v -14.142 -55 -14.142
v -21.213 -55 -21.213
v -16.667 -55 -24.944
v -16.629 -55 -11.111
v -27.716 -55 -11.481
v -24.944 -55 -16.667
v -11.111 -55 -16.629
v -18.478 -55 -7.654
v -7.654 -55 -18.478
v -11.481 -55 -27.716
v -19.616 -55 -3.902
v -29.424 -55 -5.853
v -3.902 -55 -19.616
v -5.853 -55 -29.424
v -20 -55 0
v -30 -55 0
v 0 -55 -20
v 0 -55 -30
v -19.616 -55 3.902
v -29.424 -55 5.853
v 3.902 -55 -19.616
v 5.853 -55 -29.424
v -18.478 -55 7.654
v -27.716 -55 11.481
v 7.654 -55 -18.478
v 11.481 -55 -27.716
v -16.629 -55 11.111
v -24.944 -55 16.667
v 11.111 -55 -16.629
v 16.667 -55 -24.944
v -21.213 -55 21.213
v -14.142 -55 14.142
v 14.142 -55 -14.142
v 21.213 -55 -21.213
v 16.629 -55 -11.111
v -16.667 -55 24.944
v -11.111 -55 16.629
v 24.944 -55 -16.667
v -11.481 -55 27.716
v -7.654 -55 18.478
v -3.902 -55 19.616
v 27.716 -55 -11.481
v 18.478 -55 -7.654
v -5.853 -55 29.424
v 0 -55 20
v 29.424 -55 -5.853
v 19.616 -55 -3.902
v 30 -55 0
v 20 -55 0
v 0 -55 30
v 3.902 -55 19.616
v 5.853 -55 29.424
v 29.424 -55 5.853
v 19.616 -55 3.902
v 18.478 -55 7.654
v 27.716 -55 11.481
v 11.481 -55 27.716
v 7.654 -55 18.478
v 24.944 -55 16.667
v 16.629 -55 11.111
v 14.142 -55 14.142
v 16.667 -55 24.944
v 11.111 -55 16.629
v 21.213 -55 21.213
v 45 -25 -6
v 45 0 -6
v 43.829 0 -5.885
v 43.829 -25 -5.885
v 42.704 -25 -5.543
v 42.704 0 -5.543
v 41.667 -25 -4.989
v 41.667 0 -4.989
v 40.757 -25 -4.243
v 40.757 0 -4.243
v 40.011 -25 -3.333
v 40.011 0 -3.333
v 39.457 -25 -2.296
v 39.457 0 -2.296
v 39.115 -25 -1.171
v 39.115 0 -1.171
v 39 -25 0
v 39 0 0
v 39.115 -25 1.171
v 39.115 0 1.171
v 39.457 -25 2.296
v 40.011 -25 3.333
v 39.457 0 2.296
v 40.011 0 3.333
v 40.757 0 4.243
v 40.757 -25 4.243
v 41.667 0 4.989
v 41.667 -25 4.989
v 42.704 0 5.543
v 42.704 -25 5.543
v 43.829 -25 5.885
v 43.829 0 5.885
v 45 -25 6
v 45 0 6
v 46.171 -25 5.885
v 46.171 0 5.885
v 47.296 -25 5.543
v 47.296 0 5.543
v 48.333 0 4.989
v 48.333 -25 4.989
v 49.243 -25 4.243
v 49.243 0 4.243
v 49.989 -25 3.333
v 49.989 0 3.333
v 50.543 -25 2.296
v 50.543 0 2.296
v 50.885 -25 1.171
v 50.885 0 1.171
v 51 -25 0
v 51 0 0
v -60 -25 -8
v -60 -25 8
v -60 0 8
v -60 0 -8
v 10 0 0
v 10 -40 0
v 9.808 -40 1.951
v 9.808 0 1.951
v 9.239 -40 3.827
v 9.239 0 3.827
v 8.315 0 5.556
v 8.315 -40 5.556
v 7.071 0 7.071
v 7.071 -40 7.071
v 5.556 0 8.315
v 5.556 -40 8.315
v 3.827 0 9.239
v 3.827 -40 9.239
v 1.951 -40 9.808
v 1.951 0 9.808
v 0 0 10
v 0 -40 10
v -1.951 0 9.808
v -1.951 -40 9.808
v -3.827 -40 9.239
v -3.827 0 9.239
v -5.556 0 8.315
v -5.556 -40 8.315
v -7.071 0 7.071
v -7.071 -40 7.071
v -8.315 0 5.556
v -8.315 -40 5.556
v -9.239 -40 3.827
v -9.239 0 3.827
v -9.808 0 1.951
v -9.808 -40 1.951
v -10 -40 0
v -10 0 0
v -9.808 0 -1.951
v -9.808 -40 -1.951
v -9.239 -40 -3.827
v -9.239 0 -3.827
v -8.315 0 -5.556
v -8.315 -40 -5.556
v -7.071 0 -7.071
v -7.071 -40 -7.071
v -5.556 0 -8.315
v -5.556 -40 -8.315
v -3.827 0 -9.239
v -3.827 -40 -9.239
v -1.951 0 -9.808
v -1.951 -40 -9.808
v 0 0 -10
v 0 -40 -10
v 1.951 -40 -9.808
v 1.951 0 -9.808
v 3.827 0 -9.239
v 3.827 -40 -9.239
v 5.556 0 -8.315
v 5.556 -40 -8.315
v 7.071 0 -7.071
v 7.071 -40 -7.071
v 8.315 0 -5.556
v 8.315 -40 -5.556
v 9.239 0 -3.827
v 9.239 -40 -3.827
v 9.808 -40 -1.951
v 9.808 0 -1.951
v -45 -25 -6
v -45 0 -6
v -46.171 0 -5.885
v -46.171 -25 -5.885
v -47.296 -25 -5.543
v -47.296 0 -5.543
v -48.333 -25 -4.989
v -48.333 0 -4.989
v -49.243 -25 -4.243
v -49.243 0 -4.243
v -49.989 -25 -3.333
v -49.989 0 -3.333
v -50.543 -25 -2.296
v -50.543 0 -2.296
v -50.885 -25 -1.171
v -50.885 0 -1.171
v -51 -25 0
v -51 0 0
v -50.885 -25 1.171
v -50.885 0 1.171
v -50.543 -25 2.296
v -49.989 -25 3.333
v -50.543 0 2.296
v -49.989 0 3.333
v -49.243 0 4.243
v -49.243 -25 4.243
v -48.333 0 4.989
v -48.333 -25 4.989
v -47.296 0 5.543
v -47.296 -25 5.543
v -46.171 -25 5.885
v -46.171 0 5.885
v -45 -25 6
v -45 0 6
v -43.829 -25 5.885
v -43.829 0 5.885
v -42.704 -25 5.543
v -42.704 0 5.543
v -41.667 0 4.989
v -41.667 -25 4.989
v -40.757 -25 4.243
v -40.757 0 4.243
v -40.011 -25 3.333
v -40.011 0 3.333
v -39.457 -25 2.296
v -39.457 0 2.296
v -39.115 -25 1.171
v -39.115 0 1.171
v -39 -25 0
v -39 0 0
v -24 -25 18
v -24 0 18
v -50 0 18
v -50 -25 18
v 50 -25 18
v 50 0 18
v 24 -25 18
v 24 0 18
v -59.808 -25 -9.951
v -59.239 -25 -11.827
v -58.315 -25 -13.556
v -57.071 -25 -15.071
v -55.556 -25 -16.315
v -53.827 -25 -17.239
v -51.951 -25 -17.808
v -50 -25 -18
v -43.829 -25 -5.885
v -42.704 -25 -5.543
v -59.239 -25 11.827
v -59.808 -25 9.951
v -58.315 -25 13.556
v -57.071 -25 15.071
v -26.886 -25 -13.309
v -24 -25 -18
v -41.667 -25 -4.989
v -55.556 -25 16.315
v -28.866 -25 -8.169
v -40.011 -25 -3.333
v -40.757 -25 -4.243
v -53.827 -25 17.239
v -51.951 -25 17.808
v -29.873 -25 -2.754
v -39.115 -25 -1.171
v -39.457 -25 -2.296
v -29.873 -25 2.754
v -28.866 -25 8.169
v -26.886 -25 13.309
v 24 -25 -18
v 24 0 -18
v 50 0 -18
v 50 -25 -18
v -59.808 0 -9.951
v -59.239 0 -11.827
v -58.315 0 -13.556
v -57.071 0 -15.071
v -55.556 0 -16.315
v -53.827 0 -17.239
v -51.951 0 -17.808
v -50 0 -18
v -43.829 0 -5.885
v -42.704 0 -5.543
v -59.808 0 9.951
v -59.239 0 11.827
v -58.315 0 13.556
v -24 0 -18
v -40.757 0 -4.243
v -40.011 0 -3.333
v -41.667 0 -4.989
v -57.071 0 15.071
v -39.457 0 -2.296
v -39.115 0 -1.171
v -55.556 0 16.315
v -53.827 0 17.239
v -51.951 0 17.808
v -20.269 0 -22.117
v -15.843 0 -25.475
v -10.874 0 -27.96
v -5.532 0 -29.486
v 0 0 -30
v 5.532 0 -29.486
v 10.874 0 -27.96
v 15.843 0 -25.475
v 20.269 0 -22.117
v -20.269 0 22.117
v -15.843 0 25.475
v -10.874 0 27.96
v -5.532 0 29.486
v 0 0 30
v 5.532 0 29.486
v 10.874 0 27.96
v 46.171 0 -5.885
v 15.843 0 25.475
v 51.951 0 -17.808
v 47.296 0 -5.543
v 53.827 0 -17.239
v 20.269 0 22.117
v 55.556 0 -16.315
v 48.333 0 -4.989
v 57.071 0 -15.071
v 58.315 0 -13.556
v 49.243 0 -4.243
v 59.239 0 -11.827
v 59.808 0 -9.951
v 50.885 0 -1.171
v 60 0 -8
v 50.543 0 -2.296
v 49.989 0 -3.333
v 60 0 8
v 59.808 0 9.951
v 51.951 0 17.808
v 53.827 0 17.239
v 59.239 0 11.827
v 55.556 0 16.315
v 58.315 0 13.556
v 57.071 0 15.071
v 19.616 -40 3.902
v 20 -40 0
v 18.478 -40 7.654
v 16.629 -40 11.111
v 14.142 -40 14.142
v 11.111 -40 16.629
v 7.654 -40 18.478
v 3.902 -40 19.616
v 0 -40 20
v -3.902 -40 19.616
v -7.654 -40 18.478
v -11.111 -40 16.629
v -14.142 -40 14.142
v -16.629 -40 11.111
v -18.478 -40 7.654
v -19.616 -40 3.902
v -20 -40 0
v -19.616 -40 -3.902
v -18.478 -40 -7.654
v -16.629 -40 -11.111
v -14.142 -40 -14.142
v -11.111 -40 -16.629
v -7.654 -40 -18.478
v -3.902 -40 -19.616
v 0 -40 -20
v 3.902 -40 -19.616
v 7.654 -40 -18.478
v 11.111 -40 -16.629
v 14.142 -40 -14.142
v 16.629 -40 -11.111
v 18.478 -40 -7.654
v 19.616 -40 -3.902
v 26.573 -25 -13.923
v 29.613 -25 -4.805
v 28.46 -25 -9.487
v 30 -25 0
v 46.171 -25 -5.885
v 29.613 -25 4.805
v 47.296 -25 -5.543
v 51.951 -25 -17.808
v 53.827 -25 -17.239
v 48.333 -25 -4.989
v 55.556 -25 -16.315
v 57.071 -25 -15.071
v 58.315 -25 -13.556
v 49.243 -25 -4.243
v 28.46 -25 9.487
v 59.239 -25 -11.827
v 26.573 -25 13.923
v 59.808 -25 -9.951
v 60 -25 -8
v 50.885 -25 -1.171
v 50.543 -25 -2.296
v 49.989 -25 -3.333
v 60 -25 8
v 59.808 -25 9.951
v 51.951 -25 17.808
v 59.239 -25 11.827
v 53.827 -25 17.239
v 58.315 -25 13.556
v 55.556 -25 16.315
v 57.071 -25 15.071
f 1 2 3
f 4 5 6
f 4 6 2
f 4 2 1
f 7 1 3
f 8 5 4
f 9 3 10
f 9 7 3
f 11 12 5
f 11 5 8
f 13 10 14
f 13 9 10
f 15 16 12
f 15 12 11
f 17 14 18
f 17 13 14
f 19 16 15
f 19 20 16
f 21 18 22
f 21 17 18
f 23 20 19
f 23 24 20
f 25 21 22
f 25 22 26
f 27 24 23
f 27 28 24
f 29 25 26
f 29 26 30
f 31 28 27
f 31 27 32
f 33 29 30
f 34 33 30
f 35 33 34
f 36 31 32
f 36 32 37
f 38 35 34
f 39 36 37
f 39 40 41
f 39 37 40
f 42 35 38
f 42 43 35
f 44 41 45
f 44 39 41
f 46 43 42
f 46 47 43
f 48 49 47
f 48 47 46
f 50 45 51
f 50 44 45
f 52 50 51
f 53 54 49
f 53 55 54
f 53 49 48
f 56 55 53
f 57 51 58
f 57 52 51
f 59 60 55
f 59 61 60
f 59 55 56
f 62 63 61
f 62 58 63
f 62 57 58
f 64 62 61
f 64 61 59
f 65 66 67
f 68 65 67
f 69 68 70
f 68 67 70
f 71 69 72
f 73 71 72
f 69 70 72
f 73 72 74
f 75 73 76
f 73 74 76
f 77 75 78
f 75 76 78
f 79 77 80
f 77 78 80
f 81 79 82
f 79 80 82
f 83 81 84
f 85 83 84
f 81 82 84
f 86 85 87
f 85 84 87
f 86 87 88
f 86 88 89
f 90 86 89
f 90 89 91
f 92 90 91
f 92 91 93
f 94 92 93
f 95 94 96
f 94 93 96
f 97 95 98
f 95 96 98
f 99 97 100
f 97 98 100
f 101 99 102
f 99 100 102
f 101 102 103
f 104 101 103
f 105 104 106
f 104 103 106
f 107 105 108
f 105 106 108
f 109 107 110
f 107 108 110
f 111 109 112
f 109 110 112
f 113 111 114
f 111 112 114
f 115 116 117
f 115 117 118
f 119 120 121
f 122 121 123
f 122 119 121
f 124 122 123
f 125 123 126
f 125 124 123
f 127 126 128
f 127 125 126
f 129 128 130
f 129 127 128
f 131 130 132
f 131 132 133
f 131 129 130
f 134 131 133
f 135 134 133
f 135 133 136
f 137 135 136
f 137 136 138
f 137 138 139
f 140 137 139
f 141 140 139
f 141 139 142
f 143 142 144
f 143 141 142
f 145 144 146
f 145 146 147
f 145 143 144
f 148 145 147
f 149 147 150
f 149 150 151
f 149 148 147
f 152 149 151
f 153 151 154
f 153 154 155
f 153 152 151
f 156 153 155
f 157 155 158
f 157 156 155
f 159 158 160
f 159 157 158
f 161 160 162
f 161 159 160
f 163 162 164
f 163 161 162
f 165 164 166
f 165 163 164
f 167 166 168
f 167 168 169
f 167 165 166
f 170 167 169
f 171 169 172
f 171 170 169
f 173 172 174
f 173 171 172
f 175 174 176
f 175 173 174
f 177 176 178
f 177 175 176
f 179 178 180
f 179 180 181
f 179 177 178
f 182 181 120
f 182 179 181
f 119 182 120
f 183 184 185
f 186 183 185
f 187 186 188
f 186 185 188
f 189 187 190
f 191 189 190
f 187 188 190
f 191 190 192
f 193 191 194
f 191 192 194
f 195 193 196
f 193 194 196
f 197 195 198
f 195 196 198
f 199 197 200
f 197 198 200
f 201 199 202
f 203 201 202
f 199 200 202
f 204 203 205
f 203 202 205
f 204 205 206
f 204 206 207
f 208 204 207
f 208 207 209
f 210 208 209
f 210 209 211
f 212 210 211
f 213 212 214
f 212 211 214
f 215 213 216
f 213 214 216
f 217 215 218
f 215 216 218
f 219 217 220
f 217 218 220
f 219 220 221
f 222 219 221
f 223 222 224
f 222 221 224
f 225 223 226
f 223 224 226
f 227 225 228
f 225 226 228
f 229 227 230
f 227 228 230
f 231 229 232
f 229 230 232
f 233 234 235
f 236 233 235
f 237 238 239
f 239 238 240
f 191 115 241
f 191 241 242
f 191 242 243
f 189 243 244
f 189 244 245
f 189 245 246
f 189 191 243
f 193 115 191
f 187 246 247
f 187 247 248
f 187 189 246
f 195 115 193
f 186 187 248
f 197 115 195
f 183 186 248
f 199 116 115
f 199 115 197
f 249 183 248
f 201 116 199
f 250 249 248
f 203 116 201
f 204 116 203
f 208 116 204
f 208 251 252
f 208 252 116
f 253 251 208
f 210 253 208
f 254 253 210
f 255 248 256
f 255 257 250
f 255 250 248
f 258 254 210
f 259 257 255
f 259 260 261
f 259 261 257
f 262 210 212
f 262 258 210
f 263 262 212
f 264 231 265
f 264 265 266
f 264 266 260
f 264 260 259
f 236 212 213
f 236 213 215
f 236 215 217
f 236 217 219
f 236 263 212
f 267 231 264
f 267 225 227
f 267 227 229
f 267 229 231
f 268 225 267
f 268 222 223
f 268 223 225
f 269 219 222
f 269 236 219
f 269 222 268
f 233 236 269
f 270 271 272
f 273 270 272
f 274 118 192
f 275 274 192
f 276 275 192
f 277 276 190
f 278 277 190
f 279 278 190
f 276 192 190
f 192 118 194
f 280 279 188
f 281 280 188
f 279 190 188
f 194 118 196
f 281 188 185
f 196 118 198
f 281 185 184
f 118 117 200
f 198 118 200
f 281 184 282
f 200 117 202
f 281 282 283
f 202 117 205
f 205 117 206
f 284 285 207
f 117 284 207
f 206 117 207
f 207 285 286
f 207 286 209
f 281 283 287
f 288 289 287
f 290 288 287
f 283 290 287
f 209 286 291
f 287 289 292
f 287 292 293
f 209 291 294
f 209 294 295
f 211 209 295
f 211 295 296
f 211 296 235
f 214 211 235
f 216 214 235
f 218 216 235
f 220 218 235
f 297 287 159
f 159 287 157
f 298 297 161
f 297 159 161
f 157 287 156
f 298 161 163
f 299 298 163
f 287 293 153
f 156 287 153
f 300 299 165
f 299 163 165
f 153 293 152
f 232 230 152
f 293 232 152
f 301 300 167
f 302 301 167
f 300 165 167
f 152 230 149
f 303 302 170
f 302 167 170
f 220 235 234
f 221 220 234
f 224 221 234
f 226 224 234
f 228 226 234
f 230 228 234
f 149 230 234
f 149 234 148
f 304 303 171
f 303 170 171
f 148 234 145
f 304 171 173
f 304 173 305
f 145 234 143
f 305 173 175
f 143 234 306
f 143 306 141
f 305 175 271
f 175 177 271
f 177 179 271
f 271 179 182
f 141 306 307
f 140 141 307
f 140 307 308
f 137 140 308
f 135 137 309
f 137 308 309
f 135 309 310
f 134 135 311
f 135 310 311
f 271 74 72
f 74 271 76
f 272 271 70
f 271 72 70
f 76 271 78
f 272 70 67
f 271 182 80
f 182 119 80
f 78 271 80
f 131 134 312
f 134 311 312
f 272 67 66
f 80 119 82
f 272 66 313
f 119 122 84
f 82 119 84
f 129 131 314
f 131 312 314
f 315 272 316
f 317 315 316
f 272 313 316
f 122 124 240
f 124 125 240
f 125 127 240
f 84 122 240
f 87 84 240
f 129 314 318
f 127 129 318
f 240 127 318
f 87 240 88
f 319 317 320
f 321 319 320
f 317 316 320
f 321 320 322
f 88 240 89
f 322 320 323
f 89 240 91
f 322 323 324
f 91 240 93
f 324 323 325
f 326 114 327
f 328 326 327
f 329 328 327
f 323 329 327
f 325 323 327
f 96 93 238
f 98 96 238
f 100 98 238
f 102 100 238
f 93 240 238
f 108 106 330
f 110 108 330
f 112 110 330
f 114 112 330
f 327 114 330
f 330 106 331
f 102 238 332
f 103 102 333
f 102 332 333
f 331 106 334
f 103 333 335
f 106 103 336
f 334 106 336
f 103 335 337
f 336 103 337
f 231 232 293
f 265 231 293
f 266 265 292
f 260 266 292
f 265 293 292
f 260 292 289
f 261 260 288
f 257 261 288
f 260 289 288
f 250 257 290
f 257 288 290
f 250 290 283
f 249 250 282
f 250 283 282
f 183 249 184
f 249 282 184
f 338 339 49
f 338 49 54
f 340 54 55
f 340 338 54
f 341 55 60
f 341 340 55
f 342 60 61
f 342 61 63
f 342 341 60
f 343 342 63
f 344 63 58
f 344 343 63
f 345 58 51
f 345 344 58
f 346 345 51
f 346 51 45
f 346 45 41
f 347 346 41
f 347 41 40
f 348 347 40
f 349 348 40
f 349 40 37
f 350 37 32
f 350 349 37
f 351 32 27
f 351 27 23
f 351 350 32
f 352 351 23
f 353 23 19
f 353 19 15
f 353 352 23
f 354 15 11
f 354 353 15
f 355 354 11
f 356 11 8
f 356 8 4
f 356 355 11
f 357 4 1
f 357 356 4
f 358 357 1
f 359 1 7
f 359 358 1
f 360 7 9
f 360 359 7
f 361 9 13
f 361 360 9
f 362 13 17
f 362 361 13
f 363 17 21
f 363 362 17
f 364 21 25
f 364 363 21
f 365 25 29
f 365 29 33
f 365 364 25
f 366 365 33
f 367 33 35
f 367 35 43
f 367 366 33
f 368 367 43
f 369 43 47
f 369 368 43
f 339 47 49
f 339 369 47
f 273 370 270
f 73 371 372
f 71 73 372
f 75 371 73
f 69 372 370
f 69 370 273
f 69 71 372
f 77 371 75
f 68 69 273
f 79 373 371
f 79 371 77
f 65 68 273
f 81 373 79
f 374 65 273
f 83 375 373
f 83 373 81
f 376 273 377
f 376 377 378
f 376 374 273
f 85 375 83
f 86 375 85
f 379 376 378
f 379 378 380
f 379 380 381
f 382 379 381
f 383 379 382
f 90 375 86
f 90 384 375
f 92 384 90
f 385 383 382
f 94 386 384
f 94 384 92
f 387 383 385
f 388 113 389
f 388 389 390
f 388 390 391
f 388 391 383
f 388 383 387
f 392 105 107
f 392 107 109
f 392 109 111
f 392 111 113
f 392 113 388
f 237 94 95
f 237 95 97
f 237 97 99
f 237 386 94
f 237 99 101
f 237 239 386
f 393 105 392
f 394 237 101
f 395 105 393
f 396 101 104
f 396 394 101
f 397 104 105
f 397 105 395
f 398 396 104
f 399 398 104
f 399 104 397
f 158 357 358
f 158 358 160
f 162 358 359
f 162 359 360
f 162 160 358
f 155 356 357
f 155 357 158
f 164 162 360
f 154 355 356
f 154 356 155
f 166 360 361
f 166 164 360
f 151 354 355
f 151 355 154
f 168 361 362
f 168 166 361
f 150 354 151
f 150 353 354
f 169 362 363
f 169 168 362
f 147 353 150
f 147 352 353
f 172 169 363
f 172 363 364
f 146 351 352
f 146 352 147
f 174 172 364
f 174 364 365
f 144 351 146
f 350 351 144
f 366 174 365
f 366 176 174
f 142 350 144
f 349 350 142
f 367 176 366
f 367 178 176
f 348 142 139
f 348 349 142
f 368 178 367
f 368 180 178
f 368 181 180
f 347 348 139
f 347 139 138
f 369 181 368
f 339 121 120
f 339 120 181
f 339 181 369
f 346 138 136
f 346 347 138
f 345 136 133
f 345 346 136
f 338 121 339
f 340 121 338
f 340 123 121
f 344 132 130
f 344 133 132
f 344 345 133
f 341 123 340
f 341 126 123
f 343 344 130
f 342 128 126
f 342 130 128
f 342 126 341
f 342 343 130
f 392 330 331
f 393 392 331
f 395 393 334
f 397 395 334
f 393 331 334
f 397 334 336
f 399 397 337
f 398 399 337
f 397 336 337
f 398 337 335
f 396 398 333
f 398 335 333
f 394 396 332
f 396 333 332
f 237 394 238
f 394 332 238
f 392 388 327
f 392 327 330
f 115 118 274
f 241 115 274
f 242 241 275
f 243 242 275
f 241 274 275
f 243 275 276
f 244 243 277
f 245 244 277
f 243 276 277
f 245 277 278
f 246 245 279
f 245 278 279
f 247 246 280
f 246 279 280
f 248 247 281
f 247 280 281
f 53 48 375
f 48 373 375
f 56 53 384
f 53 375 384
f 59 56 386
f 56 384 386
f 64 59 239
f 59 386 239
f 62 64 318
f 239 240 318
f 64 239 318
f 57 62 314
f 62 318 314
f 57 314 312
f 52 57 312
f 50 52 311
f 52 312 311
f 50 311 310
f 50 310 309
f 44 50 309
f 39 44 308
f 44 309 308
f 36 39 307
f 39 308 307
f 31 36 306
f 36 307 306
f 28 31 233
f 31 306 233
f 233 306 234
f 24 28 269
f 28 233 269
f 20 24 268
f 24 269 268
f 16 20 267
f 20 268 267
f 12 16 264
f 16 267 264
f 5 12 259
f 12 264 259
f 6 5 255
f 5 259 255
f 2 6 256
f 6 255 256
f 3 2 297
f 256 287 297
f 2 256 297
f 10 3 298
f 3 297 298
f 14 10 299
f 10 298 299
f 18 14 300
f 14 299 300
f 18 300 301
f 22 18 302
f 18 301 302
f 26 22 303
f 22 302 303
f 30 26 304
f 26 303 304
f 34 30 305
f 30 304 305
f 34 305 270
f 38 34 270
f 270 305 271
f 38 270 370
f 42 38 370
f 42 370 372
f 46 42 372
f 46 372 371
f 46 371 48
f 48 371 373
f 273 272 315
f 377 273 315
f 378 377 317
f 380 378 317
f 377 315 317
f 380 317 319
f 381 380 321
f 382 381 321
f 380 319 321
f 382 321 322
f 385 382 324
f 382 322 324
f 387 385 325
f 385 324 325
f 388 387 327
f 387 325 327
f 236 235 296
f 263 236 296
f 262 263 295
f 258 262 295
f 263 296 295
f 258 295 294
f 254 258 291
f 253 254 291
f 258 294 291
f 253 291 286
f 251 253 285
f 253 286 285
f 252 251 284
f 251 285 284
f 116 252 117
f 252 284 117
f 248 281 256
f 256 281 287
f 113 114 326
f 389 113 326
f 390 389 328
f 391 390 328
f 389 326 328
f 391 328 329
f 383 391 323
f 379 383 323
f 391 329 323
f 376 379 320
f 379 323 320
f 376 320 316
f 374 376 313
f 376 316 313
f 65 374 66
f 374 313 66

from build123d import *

# Parameters (mm, degrees)
F0_R     = 10
F1_DEPTH = 25
F2_R     = 30
F2_R_2   = 10
F3_DEPTH = 15
F4_R     = 30
F4_R_2   = 20
F5_DEPTH = 15


with BuildPart() as f1:
    # F0 (on Front) → F1 (new body)
    with BuildSketch(Plane.XZ):
        with BuildLine():
            ThreePointArc((24, -18), (28.4604989415, -9.4868329805), (30, 0))
            ThreePointArc((30, 0), (28.4604989415, 9.4868329805), (24, 18))
            Line((24, 18), (-24, 18))
            ThreePointArc((-24, 18), (-30, 0), (-24, -18))
            Line((-24, -18), (24, -18))
        make_face()
        Circle(F0_R, mode=Mode.SUBTRACT)
        with BuildLine():
            ThreePointArc((24, 18), (28.4604989415, 9.4868329805), (30, 0))
            ThreePointArc((30, 0), (28.4604989415, -9.4868329805), (24, -18))
            Line((24, -18), (45, -18))
            Line((45, -18), (50, -18))
            ThreePointArc((50, -18), (57.0710678119, -15.0710678119), (60, -8))
            Line((60, -8), (60, 8))
            ThreePointArc((60, 8), (57.0710678119, 15.0710678119), (50, 18))
            Line((50, 18), (24, 18))
        make_face()
        with BuildLine():
            ThreePointArc((51, 0), (49.2426406871, -4.2426406871), (45, -6))
            ThreePointArc((45, -6), (40.7573593129, 4.2426406871), (51, 0))
        make_face(mode=Mode.SUBTRACT)
        with BuildLine():
            Line((-24, 18), (24, 18))
            ThreePointArc((24, 18), (0, 30), (-24, 18))
        make_face()
        with BuildLine():
            ThreePointArc((-24, -18), (0, -30), (24, -18))
            Line((24, -18), (-24, -18))
        make_face()
        with BuildLine():
            ThreePointArc((-24, -18), (-30, 0), (-24, 18))
            Line((-24, 18), (-50, 18))
            ThreePointArc((-50, 18), (-57.0710678119, 15.0710678119), (-60, 8))
            Line((-60, 8), (-60, -8))
            ThreePointArc((-60, -8), (-57.0710678119, -15.0710678119), (-50, -18))
            Line((-50, -18), (-45, -18))
            Line((-45, -18), (-24, -18))
        make_face()
        with BuildLine():
            ThreePointArc((-39, 0), (-40.7573593129, -4.2426406871), (-45, -6))
            ThreePointArc((-45, -6), (-49.2426406871, 4.2426406871), (-39, 0))
        make_face(mode=Mode.SUBTRACT)
    extrude(amount=F1_DEPTH)

    # F2 (on face) → F3 (join)
    with BuildSketch(Plane.XZ.offset(25)):
        Circle(F2_R)
        Circle(F2_R_2, mode=Mode.SUBTRACT)
    extrude(amount=F3_DEPTH)

    # F4 (on face) → F5 (join)
    with BuildSketch(Plane.XZ.offset(40)):
        Circle(F4_R)
        Circle(F4_R_2, mode=Mode.SUBTRACT)
    extrude(amount=F5_DEPTH)


solid = f1.part
